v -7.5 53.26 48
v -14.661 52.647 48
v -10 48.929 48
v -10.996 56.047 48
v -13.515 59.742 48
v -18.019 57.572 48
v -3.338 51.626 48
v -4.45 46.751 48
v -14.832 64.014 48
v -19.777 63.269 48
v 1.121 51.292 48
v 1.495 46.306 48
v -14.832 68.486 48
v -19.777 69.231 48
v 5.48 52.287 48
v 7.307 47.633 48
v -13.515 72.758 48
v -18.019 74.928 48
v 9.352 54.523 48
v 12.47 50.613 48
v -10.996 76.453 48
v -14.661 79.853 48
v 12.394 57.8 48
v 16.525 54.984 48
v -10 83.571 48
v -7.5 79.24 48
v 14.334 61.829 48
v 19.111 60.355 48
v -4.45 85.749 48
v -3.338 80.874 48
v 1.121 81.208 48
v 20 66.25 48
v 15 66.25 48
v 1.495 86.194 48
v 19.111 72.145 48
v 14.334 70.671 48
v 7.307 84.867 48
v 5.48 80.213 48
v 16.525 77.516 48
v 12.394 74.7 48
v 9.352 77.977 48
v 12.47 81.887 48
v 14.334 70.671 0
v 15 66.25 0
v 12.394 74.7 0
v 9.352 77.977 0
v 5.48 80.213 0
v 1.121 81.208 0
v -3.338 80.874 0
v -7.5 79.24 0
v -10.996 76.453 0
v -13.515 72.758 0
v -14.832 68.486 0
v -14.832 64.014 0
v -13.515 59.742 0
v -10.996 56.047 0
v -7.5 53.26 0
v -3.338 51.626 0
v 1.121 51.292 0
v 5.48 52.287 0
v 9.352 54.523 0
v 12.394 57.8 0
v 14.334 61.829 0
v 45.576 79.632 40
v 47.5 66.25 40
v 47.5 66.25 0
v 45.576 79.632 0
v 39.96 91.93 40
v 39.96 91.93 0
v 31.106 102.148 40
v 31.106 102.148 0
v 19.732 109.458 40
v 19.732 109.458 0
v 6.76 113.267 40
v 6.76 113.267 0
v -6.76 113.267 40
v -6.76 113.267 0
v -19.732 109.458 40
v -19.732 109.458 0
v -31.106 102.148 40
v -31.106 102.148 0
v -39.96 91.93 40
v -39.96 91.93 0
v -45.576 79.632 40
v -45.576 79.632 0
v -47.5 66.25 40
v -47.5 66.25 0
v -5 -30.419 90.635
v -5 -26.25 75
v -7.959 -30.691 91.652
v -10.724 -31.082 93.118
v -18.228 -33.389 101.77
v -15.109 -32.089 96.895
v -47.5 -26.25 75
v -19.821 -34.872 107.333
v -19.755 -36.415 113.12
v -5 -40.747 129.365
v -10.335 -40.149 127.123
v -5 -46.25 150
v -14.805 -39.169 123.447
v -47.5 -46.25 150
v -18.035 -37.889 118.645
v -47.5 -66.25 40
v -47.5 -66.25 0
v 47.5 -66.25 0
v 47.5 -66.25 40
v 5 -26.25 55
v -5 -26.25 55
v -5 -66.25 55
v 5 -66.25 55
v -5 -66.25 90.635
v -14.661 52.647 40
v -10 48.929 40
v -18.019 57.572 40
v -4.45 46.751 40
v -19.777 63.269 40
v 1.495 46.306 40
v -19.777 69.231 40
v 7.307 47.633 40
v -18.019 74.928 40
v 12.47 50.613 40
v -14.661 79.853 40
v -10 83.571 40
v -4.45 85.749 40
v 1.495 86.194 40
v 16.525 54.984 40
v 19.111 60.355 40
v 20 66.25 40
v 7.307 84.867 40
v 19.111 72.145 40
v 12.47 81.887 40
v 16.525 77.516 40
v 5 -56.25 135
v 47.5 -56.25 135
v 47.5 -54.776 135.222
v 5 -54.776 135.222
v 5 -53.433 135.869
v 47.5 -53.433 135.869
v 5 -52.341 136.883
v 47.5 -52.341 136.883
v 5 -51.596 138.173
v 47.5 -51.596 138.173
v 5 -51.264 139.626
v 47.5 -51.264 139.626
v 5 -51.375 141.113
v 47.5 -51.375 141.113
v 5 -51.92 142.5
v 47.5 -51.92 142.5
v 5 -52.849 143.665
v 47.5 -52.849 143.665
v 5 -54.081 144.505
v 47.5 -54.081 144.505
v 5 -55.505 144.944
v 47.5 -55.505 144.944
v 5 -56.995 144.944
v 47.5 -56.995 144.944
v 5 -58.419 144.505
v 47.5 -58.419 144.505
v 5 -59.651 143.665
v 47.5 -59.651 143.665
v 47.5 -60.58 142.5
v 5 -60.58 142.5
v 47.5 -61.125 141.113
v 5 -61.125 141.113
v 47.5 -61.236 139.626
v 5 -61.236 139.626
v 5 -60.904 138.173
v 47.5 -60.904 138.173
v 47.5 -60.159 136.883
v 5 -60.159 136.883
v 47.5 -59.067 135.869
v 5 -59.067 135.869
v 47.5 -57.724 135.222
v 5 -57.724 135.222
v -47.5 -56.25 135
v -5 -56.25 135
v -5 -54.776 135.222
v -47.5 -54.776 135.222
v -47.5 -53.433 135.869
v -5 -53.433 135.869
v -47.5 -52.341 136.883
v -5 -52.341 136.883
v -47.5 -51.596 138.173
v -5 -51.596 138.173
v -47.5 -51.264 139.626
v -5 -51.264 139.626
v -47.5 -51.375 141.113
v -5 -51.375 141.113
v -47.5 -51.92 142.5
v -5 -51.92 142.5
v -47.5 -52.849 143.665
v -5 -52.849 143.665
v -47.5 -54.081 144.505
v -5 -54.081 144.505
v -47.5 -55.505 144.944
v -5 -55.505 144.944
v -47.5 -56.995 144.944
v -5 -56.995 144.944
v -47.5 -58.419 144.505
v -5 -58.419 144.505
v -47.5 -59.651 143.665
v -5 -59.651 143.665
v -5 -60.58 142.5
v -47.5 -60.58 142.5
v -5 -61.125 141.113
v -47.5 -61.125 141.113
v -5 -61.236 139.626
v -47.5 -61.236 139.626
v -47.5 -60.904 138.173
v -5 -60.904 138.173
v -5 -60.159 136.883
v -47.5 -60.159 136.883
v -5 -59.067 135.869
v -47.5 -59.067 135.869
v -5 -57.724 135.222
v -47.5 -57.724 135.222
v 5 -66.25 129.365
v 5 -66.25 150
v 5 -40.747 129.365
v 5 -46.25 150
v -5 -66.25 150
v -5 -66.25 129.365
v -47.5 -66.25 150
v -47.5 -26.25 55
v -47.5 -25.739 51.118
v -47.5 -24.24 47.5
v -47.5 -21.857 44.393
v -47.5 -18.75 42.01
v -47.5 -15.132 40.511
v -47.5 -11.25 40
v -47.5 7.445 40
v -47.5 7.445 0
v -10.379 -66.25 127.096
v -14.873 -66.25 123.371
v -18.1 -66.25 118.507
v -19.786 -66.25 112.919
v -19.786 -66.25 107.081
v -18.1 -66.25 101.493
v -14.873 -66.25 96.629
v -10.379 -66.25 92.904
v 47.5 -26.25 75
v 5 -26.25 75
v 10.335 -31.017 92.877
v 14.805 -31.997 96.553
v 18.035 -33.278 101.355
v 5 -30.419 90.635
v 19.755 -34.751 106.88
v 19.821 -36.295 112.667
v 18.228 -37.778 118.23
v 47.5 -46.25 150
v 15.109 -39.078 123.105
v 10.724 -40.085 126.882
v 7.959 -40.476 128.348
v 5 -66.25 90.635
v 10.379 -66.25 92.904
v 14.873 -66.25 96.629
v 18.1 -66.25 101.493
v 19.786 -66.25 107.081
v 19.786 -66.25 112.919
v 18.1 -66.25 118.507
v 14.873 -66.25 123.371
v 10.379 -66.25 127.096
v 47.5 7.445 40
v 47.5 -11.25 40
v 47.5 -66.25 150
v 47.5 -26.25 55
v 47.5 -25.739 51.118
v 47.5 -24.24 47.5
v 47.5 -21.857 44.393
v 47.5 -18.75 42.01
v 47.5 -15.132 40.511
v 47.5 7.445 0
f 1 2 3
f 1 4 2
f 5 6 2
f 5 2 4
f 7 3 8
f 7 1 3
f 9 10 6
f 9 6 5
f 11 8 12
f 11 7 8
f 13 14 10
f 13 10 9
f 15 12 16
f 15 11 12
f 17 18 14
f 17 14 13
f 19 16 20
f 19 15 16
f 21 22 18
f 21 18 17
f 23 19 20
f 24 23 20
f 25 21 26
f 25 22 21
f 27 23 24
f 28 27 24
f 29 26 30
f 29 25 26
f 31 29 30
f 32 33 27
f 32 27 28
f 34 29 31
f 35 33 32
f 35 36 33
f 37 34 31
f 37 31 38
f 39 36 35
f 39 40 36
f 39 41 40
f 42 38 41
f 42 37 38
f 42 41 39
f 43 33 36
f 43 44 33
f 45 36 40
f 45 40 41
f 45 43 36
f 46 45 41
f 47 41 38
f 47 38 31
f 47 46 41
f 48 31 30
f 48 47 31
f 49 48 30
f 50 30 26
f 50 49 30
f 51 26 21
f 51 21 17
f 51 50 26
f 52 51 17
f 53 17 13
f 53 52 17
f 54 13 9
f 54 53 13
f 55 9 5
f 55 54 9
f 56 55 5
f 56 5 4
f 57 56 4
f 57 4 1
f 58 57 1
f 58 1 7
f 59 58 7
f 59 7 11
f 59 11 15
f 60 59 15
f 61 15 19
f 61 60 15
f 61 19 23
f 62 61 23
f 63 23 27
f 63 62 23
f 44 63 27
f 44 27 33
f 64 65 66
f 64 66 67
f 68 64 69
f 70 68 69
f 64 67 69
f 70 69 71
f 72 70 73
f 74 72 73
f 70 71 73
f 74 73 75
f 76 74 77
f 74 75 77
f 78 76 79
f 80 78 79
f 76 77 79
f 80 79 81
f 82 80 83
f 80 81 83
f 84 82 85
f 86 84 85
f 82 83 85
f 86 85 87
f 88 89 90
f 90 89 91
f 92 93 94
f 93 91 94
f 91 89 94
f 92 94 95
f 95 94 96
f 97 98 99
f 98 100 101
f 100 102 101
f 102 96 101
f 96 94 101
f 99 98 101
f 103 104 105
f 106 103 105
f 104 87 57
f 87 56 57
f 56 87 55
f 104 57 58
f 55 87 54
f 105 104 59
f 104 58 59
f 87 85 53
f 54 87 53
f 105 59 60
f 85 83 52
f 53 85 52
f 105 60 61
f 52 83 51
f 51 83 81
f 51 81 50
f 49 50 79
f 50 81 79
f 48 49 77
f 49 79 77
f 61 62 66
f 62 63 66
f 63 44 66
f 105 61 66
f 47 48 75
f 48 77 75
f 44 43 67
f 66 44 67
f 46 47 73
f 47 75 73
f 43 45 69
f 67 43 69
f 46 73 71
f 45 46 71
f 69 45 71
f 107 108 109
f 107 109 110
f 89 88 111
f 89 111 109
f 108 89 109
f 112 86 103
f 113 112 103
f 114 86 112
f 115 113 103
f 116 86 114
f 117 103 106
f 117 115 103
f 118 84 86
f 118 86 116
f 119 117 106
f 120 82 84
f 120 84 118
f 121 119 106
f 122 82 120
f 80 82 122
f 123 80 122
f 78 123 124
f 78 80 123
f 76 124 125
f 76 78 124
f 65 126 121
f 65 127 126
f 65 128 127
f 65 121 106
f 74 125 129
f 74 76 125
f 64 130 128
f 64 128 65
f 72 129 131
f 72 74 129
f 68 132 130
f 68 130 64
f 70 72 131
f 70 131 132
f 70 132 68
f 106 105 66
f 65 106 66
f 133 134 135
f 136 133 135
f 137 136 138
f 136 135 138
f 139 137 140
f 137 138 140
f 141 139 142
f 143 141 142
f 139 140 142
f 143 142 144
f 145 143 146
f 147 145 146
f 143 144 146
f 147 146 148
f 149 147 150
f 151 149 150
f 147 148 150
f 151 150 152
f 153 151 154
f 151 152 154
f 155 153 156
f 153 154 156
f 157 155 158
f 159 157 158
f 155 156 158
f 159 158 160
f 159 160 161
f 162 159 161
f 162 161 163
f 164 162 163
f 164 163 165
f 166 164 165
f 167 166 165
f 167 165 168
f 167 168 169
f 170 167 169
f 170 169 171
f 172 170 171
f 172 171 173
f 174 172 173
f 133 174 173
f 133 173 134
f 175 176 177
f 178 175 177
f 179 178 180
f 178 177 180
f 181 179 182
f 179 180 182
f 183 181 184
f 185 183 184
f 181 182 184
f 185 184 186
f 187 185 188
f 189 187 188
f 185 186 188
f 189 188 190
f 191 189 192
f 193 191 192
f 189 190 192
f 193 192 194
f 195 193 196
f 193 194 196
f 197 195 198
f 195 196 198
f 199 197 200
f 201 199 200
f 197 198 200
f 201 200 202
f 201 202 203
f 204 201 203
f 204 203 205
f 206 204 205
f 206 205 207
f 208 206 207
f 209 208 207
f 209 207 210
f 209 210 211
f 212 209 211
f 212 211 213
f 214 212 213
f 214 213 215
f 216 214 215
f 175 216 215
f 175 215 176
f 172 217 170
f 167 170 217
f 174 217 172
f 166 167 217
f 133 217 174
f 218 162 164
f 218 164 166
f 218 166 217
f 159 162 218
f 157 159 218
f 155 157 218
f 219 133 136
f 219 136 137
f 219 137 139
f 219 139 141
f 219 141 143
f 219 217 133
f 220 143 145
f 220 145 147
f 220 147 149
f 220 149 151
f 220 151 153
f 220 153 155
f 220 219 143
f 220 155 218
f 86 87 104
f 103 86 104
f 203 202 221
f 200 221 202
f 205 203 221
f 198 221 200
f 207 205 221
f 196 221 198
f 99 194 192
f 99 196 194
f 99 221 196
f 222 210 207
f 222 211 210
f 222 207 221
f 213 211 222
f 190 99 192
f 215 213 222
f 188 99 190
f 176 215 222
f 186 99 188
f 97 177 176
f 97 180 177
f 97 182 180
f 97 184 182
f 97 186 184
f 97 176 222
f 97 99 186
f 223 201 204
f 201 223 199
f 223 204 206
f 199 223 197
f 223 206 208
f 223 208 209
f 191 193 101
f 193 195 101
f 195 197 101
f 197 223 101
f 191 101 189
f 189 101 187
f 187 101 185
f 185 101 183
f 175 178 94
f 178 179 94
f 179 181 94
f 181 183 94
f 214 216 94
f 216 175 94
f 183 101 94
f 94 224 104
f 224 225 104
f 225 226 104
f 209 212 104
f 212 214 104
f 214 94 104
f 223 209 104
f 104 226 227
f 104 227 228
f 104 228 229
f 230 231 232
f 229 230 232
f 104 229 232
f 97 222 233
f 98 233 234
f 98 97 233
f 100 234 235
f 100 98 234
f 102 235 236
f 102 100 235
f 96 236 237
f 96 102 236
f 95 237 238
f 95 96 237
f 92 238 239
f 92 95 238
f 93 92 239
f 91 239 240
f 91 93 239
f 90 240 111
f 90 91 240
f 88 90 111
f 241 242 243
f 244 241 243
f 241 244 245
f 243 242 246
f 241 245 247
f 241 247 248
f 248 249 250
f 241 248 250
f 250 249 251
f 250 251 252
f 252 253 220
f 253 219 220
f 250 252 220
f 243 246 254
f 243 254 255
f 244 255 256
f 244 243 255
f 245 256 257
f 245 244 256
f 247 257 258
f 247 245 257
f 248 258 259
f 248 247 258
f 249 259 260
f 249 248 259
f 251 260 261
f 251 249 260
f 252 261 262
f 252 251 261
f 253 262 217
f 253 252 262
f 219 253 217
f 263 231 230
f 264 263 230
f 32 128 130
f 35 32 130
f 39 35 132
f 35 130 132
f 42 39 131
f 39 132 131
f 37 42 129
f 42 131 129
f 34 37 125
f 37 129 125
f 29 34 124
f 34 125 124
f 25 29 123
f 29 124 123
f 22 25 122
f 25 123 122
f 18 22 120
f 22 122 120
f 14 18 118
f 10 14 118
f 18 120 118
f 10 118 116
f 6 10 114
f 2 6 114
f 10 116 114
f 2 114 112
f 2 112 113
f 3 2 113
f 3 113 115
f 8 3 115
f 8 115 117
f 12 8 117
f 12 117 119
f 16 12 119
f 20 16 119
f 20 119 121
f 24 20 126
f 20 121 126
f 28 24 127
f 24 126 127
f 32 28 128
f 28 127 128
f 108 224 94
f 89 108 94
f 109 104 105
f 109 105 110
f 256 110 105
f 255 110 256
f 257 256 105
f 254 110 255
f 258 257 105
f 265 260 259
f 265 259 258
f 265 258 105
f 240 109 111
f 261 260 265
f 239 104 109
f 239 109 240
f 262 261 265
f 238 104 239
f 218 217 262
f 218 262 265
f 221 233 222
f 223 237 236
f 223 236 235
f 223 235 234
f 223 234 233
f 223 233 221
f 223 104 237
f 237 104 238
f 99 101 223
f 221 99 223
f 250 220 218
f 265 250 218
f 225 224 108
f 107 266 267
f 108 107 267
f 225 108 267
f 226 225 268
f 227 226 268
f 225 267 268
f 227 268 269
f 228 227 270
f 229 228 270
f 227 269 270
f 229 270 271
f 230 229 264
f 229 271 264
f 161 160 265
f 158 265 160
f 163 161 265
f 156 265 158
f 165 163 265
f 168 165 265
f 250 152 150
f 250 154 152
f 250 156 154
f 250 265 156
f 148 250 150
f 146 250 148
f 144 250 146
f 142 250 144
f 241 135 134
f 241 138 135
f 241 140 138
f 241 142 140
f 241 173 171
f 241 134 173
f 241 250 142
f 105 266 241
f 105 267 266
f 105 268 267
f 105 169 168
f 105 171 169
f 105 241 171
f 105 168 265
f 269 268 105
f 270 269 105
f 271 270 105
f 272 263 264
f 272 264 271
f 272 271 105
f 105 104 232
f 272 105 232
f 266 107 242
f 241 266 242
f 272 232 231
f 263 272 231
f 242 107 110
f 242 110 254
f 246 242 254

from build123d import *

# Parameters (mm, degrees)
CROQUIS1_R              = 15
SALIENTE_EXTRUIR1_DEPTH = 40
SALIENTE_EXTRUIR2_DEPTH = 95
REDONDEO1_R             = 15
CORTAR_EXTRUIR1_DEPTH   = 95
CROQUIS4_R              = 5
CORTAR_EXTRUIR2_DEPTH   = 95
CROQUIS5_R              = 20
CROQUIS5_R_2            = 15
SALIENTE_EXTRUIR3_DEPTH = 8


with BuildPart() as part:
    # Croquis1 → Saliente-Extruir1 (new body)
    with BuildSketch(Plane.XY):
        with BuildLine():
            Line((-47.5, 66.25), (-47.5, -66.25))
            Line((-47.5, -66.25), (47.5, -66.25))
            Line((47.5, -66.25), (47.5, 66.25))
            ThreePointArc((47.5, 66.25), (0, 113.75), (-47.5, 66.25))
        make_face()
        with Locations((0, 66.25)):
            Circle(CROQUIS1_R, mode=Mode.SUBTRACT)
    extrude(amount=SALIENTE_EXTRUIR1_DEPTH)

    # Croquis5 → Saliente-Extruir3 (add)
    with BuildSketch(Plane.XY.offset(40)):
        with Locations((0, 66.25)):
            Circle(CROQUIS5_R)
        with Locations((0, 66.25)):
            Circle(CROQUIS5_R_2, mode=Mode.SUBTRACT)
    extrude(amount=SALIENTE_EXTRUIR3_DEPTH)


with BuildPart() as body_2:
    # Croquis2 → Saliente-Extruir2 (new body)
    with BuildSketch(Plane.ZY.offset(47.5)):
        Polygon((40, -26.25), (75, -26.25), (150, -46.25), (150, -66.25), (40, -66.25), (0, -66.25), (0, 7.445462918), (40, 7.445462918), align=None)
    extrude(amount=-SALIENTE_EXTRUIR2_DEPTH)

    # Redondeo1
    redondeo1_edges = [body_2.edges().sort_by_distance(p)[0] for p in [
        (0, -26.25, 40),
    ]]
    fillet(redondeo1_edges, radius=REDONDEO1_R)

    # Croquis3 → Cortar-Extruir1 (cut)
    with BuildSketch(Plane(origin=(0, -26.25, 0), x_dir=(1, 0, 0), z_dir=(0, 1, 0))):
        with BuildLine():
            Line((0, -55), (5, -55))
            Line((5, -55), (5, -90.635083269))
            ThreePointArc((5, -90.635083269), (20, -110), (5, -129.364916731))
            Line((5, -129.364916731), (5, -150))
            Line((5, -150), (-5, -150))
            Line((-5, -150), (-5, -129.364916731))
            ThreePointArc((-5, -129.364916731), (-20, -110), (-5, -90.635083269))
            Line((-5, -90.635083269), (-5, -55))
            Line((-5, -55), (0, -55))
        make_face()
    extrude(amount=-CORTAR_EXTRUIR1_DEPTH, mode=Mode.SUBTRACT)

    # Croquis4 → Cortar-Extruir2 (cut)
    with BuildSketch(Plane(origin=(47.5, 0, 0), x_dir=(0, 0, -1), z_dir=(1, 0, 0))):
        with Locations((-140, -56.25)):
            Circle(CROQUIS4_R)
    extrude(amount=-CORTAR_EXTRUIR2_DEPTH, mode=Mode.SUBTRACT)


solid = Compound([part.part, body_2.part])
